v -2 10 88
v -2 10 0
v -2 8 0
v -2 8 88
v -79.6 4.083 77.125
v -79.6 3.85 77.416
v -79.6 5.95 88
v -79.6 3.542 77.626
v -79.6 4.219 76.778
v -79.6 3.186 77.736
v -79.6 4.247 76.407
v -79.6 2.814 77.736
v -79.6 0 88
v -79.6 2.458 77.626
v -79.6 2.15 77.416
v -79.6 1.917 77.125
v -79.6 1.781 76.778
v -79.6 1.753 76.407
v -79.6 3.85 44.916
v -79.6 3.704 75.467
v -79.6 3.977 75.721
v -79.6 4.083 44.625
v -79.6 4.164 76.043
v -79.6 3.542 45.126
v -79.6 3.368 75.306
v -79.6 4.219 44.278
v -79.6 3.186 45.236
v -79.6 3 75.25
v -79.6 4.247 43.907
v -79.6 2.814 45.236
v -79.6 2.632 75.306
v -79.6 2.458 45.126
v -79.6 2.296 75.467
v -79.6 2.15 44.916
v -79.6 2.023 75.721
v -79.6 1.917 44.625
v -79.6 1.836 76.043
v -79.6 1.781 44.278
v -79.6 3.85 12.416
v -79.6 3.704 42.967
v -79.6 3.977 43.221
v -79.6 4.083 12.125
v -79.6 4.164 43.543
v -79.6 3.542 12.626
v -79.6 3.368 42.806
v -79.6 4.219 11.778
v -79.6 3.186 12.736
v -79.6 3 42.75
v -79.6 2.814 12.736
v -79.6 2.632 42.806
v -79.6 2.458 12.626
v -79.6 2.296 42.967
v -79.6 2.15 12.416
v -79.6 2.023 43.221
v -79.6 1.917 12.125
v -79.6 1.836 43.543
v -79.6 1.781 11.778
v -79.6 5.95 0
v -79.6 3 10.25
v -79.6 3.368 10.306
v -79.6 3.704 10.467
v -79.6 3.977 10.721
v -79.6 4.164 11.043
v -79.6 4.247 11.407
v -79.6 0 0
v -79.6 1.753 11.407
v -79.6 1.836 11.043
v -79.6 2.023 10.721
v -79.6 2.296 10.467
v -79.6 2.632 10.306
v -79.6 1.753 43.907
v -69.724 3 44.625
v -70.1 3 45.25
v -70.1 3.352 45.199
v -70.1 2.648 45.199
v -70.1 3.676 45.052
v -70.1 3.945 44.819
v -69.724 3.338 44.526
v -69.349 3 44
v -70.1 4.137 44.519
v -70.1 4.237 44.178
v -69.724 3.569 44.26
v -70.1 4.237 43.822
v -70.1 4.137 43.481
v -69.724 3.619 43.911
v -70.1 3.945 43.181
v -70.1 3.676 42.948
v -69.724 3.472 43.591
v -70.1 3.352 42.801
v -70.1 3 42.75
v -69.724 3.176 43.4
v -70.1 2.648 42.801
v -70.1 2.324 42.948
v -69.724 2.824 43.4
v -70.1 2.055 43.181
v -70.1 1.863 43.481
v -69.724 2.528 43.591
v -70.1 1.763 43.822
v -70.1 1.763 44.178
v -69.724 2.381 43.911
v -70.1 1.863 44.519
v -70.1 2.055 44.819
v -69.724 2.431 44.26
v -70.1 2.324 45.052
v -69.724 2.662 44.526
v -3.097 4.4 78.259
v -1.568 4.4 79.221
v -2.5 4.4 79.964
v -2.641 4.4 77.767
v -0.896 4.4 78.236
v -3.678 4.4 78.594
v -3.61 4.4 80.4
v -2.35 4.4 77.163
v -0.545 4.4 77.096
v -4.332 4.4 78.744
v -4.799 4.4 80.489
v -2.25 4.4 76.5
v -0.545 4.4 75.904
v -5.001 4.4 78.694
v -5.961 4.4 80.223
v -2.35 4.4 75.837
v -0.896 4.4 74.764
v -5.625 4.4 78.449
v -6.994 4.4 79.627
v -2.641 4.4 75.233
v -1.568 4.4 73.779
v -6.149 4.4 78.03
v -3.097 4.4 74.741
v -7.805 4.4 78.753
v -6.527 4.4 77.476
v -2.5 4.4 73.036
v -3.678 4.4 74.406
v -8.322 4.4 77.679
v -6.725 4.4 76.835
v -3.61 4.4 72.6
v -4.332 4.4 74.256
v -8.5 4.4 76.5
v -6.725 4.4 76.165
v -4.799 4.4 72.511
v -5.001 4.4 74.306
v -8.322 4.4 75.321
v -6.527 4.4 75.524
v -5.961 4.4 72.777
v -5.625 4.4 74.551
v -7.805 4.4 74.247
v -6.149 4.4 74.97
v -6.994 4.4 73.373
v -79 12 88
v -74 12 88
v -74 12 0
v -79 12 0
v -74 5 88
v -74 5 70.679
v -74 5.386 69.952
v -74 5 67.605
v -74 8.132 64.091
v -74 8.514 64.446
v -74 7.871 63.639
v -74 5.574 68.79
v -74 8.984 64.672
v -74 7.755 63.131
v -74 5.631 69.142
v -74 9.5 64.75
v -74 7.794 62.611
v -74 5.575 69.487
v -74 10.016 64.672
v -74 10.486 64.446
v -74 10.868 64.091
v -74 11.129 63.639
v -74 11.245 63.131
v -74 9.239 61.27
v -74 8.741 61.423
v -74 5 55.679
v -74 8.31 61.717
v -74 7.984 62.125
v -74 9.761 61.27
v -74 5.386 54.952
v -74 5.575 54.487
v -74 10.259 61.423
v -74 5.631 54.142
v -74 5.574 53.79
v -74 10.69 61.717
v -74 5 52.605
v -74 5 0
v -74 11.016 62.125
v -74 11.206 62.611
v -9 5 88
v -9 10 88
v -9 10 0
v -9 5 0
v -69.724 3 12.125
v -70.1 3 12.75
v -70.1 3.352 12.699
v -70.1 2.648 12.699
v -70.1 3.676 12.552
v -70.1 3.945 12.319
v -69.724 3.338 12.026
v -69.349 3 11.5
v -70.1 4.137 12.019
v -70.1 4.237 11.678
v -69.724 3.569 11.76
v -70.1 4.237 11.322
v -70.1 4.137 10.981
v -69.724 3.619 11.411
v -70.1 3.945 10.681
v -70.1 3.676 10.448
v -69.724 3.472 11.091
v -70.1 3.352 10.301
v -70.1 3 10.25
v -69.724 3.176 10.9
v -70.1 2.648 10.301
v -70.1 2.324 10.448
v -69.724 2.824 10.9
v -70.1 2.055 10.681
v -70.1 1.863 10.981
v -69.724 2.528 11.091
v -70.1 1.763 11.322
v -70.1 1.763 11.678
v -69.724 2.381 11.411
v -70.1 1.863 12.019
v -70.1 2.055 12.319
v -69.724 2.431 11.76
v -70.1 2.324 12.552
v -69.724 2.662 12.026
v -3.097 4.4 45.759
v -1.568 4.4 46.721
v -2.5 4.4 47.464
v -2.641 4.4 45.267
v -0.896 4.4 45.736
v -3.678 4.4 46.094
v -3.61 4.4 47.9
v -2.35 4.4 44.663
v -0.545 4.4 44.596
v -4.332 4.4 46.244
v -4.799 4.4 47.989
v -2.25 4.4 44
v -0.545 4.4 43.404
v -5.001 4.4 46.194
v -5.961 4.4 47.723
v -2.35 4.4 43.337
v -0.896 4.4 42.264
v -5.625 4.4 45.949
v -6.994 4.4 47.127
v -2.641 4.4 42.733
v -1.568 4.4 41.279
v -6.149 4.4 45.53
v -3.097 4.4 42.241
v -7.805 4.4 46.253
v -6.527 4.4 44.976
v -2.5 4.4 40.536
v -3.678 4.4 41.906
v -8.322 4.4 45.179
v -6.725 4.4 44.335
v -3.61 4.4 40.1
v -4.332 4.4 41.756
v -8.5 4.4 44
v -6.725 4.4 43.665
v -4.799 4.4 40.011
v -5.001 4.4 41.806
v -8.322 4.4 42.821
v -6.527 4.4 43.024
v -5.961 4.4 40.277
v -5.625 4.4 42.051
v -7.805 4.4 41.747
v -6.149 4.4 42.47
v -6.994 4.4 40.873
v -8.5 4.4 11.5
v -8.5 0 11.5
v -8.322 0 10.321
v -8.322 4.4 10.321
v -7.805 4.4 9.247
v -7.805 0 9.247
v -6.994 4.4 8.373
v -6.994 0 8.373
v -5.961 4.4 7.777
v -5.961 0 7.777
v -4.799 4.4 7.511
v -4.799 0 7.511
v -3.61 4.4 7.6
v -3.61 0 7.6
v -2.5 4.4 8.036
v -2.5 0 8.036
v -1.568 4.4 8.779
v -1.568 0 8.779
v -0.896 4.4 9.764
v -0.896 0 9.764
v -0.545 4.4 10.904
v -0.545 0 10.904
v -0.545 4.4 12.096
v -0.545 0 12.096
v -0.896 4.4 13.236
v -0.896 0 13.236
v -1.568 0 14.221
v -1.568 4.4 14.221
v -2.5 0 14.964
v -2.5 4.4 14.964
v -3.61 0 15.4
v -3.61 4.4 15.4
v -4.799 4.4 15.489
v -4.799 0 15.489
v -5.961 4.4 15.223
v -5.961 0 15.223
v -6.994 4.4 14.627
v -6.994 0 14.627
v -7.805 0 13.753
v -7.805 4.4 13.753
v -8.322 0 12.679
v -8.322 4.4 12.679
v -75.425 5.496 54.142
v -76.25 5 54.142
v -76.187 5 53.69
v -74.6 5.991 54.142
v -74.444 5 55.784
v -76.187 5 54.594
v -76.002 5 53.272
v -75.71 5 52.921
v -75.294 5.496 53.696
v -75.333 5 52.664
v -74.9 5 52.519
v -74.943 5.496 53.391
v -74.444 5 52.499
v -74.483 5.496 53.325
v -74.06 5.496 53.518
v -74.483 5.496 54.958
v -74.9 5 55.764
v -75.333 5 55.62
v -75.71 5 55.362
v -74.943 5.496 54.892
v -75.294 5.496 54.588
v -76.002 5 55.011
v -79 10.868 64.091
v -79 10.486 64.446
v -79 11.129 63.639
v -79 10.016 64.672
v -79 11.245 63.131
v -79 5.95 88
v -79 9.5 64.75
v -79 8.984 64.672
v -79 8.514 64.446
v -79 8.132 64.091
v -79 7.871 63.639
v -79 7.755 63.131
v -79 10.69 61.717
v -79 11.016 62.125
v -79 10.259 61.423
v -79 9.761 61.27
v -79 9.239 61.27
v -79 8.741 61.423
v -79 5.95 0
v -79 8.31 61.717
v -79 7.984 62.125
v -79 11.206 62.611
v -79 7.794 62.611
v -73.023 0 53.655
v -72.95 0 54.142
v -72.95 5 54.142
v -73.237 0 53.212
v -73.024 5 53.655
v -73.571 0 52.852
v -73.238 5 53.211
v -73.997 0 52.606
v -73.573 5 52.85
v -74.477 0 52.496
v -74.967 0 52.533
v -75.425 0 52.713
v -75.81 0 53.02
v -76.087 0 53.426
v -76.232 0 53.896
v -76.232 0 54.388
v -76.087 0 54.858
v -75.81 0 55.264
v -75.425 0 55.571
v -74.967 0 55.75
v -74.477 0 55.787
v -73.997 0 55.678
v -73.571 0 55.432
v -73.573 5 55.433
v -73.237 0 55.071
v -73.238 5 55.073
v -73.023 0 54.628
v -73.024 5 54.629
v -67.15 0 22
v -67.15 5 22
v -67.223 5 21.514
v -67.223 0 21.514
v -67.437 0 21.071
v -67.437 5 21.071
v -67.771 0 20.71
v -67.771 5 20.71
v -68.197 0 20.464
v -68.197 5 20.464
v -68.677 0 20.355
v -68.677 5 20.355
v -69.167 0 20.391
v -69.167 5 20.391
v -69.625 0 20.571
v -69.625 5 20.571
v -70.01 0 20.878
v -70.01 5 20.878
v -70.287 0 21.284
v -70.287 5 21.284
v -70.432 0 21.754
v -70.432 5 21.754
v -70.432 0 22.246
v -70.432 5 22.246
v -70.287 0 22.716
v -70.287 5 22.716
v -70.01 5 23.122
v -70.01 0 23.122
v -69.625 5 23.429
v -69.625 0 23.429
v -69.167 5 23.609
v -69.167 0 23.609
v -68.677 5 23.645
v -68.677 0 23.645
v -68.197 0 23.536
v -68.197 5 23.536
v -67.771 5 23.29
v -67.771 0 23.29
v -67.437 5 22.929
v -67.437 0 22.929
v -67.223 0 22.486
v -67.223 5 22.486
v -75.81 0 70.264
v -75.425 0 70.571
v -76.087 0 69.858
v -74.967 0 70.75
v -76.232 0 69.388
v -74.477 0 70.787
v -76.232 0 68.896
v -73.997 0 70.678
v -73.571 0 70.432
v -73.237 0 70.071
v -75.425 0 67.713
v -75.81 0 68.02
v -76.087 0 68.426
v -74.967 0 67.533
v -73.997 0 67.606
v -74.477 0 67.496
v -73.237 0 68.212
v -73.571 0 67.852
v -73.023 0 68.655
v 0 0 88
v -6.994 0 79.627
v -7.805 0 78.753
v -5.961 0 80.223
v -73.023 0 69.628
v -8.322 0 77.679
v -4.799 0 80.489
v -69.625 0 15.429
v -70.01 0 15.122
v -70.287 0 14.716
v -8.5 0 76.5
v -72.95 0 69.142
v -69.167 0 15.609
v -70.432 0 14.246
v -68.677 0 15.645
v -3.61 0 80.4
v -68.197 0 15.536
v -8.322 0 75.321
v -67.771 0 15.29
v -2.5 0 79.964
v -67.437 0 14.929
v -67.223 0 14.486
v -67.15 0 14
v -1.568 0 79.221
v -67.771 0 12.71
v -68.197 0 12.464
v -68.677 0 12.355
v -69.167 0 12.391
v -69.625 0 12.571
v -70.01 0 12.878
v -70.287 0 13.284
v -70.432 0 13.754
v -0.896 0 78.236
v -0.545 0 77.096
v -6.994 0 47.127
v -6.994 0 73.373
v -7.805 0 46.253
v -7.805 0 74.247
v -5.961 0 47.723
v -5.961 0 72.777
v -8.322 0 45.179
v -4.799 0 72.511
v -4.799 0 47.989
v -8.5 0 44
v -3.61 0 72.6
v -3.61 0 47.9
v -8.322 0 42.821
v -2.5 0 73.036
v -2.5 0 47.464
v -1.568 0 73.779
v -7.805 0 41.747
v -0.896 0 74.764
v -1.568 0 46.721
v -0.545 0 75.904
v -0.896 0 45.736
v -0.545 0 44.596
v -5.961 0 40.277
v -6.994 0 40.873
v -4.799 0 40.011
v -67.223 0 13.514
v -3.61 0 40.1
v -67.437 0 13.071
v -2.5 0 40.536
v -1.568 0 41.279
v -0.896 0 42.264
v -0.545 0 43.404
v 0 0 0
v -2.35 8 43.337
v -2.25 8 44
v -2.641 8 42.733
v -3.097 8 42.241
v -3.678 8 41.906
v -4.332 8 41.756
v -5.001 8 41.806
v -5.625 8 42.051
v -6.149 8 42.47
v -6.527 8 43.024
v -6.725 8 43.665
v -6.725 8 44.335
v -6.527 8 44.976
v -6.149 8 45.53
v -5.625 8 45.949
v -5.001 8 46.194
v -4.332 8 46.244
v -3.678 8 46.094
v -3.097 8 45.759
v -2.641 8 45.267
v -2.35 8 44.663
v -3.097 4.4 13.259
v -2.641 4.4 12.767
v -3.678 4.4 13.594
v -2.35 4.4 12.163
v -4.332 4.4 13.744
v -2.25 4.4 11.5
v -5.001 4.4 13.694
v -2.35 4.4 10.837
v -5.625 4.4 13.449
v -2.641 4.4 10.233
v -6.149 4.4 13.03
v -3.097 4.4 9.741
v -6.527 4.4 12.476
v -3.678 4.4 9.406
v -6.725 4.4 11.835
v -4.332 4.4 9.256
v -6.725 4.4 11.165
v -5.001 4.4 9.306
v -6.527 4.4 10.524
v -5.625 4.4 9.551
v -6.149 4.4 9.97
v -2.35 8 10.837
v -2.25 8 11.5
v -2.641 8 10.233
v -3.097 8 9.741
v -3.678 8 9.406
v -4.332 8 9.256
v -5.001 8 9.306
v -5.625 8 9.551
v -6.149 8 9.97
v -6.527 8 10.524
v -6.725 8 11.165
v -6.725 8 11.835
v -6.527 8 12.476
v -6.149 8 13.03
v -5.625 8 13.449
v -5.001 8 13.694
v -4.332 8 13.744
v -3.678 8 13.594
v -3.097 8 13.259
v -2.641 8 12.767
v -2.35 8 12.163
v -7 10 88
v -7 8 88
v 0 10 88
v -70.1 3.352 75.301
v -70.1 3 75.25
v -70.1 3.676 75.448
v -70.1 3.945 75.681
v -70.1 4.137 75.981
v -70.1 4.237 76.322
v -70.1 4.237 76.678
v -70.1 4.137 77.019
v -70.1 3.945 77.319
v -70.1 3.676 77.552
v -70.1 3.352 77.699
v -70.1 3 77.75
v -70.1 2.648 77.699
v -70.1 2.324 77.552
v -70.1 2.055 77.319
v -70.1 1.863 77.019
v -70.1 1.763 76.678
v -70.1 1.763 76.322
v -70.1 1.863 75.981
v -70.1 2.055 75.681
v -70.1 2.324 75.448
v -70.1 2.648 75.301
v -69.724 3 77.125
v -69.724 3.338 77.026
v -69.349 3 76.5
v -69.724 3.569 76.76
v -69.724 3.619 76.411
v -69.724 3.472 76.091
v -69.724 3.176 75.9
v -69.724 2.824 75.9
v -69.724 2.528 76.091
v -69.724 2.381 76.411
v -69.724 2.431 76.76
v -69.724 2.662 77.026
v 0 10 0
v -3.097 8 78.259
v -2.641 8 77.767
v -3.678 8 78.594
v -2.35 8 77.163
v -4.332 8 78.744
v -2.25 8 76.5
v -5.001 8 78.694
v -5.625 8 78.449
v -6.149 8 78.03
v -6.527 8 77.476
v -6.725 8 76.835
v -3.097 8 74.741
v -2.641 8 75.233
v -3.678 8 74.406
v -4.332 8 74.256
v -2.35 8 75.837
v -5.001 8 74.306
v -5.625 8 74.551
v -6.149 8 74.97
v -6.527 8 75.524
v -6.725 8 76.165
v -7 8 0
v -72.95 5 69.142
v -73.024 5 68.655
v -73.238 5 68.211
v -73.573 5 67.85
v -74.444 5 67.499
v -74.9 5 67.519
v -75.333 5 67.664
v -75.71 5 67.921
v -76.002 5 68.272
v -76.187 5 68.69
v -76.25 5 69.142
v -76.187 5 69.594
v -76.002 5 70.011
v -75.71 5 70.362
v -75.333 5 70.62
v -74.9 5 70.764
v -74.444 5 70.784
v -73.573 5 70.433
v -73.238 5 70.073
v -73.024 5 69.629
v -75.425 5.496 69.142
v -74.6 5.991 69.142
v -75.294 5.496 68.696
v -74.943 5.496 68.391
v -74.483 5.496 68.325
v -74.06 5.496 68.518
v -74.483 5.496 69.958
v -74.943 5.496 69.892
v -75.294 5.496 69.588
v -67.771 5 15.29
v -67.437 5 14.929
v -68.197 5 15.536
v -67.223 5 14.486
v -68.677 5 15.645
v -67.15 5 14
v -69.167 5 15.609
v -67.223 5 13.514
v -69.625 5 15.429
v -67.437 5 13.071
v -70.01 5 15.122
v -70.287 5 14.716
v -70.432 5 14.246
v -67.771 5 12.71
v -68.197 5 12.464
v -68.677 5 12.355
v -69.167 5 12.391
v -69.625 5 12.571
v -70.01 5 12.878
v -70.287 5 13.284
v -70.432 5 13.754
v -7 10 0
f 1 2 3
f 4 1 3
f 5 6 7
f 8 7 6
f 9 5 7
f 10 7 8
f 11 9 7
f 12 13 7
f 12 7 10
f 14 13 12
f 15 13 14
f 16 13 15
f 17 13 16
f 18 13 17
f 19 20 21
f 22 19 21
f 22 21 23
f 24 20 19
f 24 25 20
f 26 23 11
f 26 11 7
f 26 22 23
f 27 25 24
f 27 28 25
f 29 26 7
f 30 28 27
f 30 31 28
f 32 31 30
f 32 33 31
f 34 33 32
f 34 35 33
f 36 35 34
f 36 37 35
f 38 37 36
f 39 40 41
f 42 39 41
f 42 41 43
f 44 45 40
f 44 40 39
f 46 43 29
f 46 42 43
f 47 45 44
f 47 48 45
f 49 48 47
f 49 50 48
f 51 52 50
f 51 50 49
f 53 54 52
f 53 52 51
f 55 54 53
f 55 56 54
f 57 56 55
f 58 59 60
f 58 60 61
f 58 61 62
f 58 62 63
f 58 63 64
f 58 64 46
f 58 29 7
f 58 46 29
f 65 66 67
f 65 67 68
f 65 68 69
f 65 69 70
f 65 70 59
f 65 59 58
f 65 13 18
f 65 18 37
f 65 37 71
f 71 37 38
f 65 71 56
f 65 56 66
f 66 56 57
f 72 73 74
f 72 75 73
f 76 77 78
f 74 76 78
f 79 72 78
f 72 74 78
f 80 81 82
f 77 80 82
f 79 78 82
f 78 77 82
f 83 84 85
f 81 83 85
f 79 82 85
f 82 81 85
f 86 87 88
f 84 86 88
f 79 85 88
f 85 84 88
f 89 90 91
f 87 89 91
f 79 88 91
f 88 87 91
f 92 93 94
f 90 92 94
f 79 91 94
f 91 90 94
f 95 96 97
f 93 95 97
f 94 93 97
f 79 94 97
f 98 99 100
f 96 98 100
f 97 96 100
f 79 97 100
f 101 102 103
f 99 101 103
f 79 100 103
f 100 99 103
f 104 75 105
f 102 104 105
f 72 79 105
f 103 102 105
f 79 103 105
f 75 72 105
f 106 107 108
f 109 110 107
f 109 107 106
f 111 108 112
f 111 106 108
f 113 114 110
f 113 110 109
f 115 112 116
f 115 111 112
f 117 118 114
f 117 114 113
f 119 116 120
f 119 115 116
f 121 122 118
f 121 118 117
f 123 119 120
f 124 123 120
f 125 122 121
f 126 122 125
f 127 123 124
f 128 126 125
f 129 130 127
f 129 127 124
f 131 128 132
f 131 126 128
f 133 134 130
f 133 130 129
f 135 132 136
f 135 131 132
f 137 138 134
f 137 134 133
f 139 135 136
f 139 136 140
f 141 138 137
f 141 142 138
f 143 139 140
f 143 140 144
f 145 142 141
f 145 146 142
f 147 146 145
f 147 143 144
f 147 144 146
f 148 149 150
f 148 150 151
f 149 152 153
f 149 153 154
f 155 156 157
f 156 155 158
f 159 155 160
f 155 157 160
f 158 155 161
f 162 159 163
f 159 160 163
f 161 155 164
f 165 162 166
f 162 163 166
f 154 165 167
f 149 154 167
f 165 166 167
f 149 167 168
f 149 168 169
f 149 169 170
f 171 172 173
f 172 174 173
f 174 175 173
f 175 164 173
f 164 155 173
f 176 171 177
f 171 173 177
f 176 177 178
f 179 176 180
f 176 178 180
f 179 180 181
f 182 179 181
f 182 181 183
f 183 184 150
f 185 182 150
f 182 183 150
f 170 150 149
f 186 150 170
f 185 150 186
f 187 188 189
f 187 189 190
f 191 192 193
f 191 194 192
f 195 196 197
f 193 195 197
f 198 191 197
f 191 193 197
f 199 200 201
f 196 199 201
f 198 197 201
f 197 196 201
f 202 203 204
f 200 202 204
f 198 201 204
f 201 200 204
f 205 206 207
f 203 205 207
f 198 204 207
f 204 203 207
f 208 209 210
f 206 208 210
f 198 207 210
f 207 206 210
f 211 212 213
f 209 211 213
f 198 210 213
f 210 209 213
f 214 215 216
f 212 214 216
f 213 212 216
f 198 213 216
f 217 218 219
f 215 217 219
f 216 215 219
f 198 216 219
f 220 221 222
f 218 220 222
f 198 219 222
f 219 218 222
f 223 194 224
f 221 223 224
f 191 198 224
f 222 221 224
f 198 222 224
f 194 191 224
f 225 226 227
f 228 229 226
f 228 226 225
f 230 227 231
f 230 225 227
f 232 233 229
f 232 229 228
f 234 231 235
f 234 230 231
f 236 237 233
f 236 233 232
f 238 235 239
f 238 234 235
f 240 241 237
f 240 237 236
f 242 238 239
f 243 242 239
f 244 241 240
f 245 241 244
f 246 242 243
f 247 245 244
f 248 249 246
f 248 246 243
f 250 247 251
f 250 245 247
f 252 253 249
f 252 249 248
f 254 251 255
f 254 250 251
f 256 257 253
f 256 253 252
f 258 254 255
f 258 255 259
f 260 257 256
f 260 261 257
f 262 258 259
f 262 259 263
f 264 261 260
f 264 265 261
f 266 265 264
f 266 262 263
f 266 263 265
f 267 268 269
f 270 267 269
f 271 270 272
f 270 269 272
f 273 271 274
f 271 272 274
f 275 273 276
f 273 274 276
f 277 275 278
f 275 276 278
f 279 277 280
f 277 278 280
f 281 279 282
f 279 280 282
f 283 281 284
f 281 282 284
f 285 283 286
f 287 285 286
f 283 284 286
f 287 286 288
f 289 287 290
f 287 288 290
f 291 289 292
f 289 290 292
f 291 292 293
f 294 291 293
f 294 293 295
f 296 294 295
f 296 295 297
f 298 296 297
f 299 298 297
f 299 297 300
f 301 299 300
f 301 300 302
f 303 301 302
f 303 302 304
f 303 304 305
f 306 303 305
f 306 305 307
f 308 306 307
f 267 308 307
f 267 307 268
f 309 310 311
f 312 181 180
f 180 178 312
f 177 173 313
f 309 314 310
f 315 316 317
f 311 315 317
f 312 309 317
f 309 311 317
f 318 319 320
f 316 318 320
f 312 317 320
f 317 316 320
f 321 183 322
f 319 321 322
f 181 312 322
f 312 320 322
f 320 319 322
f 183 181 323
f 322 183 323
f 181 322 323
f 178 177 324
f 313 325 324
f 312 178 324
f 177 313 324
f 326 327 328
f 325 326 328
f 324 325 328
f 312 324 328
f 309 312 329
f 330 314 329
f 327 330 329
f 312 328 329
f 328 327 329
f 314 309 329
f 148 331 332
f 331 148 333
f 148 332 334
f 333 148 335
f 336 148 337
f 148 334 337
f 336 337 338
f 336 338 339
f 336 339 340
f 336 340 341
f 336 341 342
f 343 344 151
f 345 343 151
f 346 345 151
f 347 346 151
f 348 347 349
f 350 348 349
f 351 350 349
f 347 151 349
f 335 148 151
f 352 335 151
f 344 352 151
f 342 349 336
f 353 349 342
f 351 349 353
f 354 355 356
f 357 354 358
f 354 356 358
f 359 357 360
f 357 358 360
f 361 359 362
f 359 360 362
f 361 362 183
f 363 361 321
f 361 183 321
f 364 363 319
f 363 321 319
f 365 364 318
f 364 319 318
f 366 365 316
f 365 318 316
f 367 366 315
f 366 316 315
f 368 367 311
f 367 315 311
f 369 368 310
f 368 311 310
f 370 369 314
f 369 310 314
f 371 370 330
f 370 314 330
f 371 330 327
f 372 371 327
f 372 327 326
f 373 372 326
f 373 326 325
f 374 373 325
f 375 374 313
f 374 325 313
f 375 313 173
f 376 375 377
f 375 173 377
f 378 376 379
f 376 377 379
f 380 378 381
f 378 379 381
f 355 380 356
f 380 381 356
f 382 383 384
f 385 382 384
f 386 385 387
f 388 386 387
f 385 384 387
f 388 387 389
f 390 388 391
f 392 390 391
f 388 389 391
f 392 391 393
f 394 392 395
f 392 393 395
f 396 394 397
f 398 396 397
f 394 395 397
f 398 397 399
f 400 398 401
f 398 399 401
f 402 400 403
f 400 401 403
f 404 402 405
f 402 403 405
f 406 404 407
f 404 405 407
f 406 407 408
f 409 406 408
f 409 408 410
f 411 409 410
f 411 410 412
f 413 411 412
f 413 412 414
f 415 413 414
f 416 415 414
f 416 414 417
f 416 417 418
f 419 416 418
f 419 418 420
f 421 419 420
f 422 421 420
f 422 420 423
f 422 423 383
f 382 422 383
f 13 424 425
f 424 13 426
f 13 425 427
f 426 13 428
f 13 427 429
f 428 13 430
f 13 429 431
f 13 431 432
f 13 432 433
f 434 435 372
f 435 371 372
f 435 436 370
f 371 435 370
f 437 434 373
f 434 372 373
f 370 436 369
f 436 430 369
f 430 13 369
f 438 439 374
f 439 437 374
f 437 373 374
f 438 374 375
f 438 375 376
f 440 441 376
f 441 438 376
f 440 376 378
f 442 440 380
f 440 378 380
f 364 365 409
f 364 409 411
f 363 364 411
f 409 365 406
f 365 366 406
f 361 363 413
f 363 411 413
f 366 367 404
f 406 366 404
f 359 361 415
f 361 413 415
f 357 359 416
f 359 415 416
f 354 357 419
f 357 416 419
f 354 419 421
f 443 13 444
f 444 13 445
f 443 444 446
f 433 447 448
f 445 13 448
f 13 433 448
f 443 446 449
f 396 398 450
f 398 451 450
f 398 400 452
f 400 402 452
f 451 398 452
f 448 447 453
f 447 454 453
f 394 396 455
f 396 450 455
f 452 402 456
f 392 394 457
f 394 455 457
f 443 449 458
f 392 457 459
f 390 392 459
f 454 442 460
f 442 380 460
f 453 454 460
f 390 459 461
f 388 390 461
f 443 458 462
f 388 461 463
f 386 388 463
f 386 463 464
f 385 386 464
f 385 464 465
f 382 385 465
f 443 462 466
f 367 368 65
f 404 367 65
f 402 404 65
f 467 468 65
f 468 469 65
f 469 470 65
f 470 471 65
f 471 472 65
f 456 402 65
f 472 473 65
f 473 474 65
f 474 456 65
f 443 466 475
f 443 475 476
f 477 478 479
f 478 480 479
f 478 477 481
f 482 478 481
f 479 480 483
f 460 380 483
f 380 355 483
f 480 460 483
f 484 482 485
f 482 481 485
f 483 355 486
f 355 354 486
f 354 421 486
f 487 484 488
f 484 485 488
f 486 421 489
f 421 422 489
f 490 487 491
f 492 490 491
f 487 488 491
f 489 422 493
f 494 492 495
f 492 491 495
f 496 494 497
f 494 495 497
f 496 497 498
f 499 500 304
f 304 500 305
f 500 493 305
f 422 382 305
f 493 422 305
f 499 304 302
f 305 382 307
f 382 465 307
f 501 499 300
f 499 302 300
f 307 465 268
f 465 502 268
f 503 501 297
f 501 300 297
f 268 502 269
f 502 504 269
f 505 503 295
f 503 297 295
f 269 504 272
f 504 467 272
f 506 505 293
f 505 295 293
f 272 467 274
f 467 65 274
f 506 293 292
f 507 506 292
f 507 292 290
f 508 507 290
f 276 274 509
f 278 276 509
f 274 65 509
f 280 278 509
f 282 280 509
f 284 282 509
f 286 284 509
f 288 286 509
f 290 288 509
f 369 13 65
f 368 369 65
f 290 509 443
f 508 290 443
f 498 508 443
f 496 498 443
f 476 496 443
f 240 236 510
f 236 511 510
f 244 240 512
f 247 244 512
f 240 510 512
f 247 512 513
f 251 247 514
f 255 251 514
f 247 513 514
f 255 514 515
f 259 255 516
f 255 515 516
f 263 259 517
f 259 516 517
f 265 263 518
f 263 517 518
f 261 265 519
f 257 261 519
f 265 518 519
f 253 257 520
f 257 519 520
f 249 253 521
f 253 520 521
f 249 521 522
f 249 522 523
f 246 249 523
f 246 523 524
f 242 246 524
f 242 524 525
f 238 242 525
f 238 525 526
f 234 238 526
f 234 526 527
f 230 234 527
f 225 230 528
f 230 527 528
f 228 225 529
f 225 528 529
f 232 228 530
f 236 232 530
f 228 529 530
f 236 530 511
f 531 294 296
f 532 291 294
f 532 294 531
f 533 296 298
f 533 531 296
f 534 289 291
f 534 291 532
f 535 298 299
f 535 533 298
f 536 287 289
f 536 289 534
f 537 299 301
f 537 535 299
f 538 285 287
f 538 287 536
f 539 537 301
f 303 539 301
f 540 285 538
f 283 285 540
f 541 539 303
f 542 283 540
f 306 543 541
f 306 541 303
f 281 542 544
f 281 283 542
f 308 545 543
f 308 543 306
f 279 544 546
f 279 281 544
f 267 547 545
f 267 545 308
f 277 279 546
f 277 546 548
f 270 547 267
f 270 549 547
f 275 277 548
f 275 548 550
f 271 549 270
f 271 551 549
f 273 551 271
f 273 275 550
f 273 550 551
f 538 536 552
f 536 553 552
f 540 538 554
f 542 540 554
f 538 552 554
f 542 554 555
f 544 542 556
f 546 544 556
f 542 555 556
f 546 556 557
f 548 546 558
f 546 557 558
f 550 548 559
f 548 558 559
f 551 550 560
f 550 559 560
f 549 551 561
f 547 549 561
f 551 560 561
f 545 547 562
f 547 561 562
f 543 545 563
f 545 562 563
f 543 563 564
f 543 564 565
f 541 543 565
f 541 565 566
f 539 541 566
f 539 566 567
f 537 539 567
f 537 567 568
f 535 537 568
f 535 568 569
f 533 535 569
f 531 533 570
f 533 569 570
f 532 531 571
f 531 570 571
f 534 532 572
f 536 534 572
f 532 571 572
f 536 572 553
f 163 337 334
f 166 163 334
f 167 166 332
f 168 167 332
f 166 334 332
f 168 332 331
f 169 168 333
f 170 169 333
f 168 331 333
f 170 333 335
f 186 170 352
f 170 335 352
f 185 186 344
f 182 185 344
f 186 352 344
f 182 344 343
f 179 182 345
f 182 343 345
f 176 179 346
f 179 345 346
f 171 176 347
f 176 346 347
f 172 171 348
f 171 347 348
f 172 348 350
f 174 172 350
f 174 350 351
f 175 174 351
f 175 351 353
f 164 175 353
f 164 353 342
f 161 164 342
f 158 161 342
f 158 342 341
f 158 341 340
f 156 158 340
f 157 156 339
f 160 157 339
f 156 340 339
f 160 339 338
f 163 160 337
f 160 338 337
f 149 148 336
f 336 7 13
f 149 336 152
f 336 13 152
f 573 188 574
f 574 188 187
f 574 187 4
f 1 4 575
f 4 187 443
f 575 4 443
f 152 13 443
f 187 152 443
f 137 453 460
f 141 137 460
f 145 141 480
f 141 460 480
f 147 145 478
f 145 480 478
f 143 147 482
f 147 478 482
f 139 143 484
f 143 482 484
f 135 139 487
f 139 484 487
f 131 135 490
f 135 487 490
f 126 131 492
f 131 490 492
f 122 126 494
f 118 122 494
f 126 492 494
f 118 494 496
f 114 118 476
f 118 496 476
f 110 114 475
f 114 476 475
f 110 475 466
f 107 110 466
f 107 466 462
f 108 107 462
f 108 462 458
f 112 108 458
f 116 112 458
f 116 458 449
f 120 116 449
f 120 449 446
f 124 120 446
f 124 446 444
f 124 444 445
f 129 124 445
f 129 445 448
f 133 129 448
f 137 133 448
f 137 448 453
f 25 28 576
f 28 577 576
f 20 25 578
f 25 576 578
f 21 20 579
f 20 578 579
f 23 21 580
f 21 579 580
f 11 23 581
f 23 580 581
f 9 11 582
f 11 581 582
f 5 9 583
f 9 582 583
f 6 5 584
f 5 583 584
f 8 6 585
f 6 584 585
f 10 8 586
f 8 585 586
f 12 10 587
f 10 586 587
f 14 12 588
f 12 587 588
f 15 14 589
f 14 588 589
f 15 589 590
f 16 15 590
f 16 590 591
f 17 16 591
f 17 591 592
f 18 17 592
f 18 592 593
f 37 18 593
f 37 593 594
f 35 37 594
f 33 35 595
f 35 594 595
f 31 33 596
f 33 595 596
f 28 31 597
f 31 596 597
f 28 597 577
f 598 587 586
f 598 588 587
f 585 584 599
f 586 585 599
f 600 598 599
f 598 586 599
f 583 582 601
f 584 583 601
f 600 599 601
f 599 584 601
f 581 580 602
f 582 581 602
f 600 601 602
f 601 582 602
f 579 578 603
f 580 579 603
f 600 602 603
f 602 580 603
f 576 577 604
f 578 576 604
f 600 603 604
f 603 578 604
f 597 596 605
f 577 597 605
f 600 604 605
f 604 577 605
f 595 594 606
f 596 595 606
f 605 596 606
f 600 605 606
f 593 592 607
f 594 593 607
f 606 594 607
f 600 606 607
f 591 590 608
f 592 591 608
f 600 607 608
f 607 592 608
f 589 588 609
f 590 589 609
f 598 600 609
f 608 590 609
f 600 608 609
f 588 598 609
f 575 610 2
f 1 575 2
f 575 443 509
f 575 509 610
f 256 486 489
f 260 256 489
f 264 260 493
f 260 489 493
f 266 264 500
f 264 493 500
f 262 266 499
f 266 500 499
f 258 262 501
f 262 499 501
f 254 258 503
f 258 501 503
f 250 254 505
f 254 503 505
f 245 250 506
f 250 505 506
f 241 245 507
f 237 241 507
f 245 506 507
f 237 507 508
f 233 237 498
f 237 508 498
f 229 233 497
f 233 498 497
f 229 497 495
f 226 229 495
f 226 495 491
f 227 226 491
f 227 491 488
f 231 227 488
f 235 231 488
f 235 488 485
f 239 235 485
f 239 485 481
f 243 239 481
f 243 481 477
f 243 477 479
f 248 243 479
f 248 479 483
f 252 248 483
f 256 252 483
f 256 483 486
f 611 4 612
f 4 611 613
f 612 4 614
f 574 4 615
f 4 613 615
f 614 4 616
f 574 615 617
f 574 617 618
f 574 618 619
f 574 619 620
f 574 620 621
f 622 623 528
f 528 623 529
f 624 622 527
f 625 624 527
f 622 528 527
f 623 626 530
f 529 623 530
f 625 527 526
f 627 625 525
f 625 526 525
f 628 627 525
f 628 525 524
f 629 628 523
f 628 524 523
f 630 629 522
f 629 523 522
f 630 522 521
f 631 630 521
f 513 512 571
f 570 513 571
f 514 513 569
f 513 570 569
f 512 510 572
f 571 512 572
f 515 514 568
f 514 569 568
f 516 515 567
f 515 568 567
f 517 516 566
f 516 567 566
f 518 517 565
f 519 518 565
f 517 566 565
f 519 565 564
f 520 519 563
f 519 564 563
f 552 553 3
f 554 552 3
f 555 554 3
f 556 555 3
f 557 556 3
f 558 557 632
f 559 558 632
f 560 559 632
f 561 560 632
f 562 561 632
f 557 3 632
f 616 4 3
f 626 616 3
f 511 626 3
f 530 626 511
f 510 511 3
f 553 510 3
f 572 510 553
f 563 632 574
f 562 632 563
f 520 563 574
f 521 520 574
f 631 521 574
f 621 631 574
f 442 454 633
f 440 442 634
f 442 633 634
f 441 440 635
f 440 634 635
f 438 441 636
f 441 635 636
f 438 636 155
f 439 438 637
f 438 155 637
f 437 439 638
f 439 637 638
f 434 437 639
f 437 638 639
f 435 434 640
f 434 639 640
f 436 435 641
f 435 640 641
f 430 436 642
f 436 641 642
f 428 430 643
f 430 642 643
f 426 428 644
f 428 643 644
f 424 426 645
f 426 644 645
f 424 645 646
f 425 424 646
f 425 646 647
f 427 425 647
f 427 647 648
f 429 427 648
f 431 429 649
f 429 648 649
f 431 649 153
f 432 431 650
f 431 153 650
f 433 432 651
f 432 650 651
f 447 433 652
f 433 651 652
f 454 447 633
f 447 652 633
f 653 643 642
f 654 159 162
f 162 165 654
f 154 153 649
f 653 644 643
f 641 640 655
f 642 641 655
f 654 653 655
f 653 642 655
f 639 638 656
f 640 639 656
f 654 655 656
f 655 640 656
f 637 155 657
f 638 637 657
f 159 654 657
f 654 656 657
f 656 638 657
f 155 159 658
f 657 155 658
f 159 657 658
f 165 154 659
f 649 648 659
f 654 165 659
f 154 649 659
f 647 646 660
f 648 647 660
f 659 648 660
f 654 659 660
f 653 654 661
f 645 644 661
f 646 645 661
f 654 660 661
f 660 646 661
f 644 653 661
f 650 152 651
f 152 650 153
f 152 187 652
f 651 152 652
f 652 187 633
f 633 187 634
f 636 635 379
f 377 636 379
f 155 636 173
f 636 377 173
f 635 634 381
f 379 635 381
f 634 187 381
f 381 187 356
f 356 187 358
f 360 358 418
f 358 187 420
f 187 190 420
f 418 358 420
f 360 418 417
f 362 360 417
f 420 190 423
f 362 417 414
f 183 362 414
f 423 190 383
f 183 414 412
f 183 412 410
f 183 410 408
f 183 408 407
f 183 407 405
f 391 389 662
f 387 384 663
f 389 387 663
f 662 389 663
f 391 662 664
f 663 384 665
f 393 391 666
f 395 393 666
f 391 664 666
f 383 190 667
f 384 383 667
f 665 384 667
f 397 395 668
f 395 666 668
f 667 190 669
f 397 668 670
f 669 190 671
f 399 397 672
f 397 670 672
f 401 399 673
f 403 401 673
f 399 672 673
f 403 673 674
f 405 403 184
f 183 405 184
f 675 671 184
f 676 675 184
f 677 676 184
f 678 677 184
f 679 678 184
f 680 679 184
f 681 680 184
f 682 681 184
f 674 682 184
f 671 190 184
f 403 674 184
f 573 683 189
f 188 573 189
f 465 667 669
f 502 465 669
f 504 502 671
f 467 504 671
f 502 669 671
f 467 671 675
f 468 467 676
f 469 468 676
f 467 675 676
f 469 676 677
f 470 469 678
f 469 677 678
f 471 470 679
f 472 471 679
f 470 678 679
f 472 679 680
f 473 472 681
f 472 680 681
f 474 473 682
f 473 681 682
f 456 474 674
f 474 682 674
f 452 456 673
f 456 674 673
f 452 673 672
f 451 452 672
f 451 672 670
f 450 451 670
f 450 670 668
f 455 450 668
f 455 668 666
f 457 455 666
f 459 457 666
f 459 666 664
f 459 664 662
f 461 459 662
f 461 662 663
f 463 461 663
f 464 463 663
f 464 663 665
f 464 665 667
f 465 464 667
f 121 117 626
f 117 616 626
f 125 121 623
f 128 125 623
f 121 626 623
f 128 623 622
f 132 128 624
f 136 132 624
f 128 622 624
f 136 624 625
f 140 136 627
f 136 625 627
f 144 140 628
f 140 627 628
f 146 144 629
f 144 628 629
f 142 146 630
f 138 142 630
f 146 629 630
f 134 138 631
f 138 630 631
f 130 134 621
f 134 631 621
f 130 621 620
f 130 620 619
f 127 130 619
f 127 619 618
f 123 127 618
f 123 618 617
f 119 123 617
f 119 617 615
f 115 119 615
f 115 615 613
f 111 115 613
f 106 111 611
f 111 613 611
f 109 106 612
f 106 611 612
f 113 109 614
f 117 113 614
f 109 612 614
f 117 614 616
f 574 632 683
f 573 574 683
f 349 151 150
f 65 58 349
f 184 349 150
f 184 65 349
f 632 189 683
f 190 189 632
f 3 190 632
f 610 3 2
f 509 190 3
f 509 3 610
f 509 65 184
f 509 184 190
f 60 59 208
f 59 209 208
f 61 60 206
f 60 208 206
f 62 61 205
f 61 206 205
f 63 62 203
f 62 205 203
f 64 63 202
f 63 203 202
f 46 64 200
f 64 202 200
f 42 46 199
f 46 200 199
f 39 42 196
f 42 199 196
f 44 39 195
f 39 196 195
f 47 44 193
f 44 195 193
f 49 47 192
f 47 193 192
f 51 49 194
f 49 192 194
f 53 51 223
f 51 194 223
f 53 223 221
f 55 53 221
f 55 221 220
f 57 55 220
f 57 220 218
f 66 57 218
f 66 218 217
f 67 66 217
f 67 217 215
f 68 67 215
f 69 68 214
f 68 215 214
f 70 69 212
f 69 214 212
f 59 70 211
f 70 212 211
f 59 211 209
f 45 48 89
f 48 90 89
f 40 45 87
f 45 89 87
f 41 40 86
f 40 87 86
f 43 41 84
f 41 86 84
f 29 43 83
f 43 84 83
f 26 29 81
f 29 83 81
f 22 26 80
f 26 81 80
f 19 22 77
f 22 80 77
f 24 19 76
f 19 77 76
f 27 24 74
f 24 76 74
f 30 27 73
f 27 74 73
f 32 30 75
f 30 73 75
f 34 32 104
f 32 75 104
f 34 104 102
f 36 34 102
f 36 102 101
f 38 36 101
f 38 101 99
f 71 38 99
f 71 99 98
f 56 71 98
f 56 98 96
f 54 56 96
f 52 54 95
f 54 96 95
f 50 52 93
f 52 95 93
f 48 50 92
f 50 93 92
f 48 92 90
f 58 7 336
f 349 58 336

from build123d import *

# Parameters (mm, degrees)
EXTRUDE_1_DEPTH              = 88
HOLE_WIZARD_M4_1_D           = 4.5
HOLE_WIZARD_M4_1_CBORE_D     = 8
HOLE_WIZARD_M4_1_CBORE_DEPTH = 4.4
HOLE_WIZARD_M4_1_2_D         = 3.3
HOLE_WIZARD_M3_1_D           = 2.5
HOLE_WIZARD_M3_1_DEPTH       = 9.5
HOLE_WIZARD_M3_1_TIP         = 0.751075774
SKETCH_8_R                   = 1.75
CUT_EXTRUDE_1_DEPTH          = 5
SKETCH_9_W                   = 0.6
SKETCH_9_H                   = 88
EXTRUDE_2_DEPTH              = 0.05
HOLE_WIZARD_M4_2_D           = 3.3
HOLE_WIZARD_M4_2_DEPTH       = 5
HOLE_WIZARD_M4_2_TIP         = 0.991420021


with BuildPart() as part:
    # 草图1 → 凸台-拉伸1 (new body)
    with BuildSketch(Plane.XY):
        Polygon((-9, 10), (-9, 5), (-74, 5), (-74, 12), (-79, 12), (-79, 5.9), (-79.6, 5.9), (-79.6, 0), (0, 0), (0, 10), (-2, 10), (-2, 8), (-7, 8), (-7, 10), align=None)
    extrude(amount=EXTRUDE_1_DEPTH)

    # Hole Wizard M4 _1 (through all)
    with Locations(Plane(origin=(0, 0, 0), x_dir=(-1, 0, 0), z_dir=(0, -1, 0))):
        with Locations((4.5, -11.5), (4.5, -44), (4.5, -76.5)):
            CounterBoreHole(HOLE_WIZARD_M4_1_D / 2, HOLE_WIZARD_M4_1_CBORE_D / 2, HOLE_WIZARD_M4_1_CBORE_DEPTH)

    # Hole Wizard M4 _1 2 (through all)
    with Locations(Plane(origin=(0, 0, 0), x_dir=(-1, 0, 0), z_dir=(0, -1, 0))):
        with Locations((68.8, -14), (68.8, -22)):
            Hole(HOLE_WIZARD_M4_1_2_D / 2)

    # M3 螺纹孔1
    with Locations(Plane.ZY.offset(79.6)):
        with Locations((11.5, 3), (44, 3), (76.5, 3)):
            Hole(HOLE_WIZARD_M3_1_D / 2, depth=HOLE_WIZARD_M3_1_DEPTH)
            with Locations((0, 0, -(HOLE_WIZARD_M3_1_DEPTH + HOLE_WIZARD_M3_1_TIP / 2))):  # 118° drill point
                Cone(0, HOLE_WIZARD_M3_1_D / 2, HOLE_WIZARD_M3_1_TIP, mode=Mode.SUBTRACT)

    # 草图8 → 切除-拉伸1 (cut)
    with BuildSketch(Plane.ZY.offset(79)):
        with Locations((63, 9.5)):
            Circle(SKETCH_8_R)
    extrude(amount=-CUT_EXTRUDE_1_DEPTH, mode=Mode.SUBTRACT)

    # 草图9 → 凸台-拉伸2 (add)
    with BuildSketch(Plane(origin=(0, 5.9, 0), x_dir=(1, 0, 0), z_dir=(0, 1, 0))):
        with Locations((-79.3, -44)):
            Rectangle(SKETCH_9_W, SKETCH_9_H)
    extrude(amount=EXTRUDE_2_DEPTH)

    # M4 螺纹孔2
    with Locations(Plane(origin=(0, 0, 0), x_dir=(-1, 0, 0), z_dir=(0, -1, 0))):
        with Locations((74.6, -54.141815628), (74.6, -69.141815628)):
            Hole(HOLE_WIZARD_M4_2_D / 2, depth=HOLE_WIZARD_M4_2_DEPTH)
            with Locations((0, 0, -(HOLE_WIZARD_M4_2_DEPTH + HOLE_WIZARD_M4_2_TIP / 2))):  # 118° drill point
                Cone(0, HOLE_WIZARD_M4_2_D / 2, HOLE_WIZARD_M4_2_TIP, mode=Mode.SUBTRACT)


solid = part.part
